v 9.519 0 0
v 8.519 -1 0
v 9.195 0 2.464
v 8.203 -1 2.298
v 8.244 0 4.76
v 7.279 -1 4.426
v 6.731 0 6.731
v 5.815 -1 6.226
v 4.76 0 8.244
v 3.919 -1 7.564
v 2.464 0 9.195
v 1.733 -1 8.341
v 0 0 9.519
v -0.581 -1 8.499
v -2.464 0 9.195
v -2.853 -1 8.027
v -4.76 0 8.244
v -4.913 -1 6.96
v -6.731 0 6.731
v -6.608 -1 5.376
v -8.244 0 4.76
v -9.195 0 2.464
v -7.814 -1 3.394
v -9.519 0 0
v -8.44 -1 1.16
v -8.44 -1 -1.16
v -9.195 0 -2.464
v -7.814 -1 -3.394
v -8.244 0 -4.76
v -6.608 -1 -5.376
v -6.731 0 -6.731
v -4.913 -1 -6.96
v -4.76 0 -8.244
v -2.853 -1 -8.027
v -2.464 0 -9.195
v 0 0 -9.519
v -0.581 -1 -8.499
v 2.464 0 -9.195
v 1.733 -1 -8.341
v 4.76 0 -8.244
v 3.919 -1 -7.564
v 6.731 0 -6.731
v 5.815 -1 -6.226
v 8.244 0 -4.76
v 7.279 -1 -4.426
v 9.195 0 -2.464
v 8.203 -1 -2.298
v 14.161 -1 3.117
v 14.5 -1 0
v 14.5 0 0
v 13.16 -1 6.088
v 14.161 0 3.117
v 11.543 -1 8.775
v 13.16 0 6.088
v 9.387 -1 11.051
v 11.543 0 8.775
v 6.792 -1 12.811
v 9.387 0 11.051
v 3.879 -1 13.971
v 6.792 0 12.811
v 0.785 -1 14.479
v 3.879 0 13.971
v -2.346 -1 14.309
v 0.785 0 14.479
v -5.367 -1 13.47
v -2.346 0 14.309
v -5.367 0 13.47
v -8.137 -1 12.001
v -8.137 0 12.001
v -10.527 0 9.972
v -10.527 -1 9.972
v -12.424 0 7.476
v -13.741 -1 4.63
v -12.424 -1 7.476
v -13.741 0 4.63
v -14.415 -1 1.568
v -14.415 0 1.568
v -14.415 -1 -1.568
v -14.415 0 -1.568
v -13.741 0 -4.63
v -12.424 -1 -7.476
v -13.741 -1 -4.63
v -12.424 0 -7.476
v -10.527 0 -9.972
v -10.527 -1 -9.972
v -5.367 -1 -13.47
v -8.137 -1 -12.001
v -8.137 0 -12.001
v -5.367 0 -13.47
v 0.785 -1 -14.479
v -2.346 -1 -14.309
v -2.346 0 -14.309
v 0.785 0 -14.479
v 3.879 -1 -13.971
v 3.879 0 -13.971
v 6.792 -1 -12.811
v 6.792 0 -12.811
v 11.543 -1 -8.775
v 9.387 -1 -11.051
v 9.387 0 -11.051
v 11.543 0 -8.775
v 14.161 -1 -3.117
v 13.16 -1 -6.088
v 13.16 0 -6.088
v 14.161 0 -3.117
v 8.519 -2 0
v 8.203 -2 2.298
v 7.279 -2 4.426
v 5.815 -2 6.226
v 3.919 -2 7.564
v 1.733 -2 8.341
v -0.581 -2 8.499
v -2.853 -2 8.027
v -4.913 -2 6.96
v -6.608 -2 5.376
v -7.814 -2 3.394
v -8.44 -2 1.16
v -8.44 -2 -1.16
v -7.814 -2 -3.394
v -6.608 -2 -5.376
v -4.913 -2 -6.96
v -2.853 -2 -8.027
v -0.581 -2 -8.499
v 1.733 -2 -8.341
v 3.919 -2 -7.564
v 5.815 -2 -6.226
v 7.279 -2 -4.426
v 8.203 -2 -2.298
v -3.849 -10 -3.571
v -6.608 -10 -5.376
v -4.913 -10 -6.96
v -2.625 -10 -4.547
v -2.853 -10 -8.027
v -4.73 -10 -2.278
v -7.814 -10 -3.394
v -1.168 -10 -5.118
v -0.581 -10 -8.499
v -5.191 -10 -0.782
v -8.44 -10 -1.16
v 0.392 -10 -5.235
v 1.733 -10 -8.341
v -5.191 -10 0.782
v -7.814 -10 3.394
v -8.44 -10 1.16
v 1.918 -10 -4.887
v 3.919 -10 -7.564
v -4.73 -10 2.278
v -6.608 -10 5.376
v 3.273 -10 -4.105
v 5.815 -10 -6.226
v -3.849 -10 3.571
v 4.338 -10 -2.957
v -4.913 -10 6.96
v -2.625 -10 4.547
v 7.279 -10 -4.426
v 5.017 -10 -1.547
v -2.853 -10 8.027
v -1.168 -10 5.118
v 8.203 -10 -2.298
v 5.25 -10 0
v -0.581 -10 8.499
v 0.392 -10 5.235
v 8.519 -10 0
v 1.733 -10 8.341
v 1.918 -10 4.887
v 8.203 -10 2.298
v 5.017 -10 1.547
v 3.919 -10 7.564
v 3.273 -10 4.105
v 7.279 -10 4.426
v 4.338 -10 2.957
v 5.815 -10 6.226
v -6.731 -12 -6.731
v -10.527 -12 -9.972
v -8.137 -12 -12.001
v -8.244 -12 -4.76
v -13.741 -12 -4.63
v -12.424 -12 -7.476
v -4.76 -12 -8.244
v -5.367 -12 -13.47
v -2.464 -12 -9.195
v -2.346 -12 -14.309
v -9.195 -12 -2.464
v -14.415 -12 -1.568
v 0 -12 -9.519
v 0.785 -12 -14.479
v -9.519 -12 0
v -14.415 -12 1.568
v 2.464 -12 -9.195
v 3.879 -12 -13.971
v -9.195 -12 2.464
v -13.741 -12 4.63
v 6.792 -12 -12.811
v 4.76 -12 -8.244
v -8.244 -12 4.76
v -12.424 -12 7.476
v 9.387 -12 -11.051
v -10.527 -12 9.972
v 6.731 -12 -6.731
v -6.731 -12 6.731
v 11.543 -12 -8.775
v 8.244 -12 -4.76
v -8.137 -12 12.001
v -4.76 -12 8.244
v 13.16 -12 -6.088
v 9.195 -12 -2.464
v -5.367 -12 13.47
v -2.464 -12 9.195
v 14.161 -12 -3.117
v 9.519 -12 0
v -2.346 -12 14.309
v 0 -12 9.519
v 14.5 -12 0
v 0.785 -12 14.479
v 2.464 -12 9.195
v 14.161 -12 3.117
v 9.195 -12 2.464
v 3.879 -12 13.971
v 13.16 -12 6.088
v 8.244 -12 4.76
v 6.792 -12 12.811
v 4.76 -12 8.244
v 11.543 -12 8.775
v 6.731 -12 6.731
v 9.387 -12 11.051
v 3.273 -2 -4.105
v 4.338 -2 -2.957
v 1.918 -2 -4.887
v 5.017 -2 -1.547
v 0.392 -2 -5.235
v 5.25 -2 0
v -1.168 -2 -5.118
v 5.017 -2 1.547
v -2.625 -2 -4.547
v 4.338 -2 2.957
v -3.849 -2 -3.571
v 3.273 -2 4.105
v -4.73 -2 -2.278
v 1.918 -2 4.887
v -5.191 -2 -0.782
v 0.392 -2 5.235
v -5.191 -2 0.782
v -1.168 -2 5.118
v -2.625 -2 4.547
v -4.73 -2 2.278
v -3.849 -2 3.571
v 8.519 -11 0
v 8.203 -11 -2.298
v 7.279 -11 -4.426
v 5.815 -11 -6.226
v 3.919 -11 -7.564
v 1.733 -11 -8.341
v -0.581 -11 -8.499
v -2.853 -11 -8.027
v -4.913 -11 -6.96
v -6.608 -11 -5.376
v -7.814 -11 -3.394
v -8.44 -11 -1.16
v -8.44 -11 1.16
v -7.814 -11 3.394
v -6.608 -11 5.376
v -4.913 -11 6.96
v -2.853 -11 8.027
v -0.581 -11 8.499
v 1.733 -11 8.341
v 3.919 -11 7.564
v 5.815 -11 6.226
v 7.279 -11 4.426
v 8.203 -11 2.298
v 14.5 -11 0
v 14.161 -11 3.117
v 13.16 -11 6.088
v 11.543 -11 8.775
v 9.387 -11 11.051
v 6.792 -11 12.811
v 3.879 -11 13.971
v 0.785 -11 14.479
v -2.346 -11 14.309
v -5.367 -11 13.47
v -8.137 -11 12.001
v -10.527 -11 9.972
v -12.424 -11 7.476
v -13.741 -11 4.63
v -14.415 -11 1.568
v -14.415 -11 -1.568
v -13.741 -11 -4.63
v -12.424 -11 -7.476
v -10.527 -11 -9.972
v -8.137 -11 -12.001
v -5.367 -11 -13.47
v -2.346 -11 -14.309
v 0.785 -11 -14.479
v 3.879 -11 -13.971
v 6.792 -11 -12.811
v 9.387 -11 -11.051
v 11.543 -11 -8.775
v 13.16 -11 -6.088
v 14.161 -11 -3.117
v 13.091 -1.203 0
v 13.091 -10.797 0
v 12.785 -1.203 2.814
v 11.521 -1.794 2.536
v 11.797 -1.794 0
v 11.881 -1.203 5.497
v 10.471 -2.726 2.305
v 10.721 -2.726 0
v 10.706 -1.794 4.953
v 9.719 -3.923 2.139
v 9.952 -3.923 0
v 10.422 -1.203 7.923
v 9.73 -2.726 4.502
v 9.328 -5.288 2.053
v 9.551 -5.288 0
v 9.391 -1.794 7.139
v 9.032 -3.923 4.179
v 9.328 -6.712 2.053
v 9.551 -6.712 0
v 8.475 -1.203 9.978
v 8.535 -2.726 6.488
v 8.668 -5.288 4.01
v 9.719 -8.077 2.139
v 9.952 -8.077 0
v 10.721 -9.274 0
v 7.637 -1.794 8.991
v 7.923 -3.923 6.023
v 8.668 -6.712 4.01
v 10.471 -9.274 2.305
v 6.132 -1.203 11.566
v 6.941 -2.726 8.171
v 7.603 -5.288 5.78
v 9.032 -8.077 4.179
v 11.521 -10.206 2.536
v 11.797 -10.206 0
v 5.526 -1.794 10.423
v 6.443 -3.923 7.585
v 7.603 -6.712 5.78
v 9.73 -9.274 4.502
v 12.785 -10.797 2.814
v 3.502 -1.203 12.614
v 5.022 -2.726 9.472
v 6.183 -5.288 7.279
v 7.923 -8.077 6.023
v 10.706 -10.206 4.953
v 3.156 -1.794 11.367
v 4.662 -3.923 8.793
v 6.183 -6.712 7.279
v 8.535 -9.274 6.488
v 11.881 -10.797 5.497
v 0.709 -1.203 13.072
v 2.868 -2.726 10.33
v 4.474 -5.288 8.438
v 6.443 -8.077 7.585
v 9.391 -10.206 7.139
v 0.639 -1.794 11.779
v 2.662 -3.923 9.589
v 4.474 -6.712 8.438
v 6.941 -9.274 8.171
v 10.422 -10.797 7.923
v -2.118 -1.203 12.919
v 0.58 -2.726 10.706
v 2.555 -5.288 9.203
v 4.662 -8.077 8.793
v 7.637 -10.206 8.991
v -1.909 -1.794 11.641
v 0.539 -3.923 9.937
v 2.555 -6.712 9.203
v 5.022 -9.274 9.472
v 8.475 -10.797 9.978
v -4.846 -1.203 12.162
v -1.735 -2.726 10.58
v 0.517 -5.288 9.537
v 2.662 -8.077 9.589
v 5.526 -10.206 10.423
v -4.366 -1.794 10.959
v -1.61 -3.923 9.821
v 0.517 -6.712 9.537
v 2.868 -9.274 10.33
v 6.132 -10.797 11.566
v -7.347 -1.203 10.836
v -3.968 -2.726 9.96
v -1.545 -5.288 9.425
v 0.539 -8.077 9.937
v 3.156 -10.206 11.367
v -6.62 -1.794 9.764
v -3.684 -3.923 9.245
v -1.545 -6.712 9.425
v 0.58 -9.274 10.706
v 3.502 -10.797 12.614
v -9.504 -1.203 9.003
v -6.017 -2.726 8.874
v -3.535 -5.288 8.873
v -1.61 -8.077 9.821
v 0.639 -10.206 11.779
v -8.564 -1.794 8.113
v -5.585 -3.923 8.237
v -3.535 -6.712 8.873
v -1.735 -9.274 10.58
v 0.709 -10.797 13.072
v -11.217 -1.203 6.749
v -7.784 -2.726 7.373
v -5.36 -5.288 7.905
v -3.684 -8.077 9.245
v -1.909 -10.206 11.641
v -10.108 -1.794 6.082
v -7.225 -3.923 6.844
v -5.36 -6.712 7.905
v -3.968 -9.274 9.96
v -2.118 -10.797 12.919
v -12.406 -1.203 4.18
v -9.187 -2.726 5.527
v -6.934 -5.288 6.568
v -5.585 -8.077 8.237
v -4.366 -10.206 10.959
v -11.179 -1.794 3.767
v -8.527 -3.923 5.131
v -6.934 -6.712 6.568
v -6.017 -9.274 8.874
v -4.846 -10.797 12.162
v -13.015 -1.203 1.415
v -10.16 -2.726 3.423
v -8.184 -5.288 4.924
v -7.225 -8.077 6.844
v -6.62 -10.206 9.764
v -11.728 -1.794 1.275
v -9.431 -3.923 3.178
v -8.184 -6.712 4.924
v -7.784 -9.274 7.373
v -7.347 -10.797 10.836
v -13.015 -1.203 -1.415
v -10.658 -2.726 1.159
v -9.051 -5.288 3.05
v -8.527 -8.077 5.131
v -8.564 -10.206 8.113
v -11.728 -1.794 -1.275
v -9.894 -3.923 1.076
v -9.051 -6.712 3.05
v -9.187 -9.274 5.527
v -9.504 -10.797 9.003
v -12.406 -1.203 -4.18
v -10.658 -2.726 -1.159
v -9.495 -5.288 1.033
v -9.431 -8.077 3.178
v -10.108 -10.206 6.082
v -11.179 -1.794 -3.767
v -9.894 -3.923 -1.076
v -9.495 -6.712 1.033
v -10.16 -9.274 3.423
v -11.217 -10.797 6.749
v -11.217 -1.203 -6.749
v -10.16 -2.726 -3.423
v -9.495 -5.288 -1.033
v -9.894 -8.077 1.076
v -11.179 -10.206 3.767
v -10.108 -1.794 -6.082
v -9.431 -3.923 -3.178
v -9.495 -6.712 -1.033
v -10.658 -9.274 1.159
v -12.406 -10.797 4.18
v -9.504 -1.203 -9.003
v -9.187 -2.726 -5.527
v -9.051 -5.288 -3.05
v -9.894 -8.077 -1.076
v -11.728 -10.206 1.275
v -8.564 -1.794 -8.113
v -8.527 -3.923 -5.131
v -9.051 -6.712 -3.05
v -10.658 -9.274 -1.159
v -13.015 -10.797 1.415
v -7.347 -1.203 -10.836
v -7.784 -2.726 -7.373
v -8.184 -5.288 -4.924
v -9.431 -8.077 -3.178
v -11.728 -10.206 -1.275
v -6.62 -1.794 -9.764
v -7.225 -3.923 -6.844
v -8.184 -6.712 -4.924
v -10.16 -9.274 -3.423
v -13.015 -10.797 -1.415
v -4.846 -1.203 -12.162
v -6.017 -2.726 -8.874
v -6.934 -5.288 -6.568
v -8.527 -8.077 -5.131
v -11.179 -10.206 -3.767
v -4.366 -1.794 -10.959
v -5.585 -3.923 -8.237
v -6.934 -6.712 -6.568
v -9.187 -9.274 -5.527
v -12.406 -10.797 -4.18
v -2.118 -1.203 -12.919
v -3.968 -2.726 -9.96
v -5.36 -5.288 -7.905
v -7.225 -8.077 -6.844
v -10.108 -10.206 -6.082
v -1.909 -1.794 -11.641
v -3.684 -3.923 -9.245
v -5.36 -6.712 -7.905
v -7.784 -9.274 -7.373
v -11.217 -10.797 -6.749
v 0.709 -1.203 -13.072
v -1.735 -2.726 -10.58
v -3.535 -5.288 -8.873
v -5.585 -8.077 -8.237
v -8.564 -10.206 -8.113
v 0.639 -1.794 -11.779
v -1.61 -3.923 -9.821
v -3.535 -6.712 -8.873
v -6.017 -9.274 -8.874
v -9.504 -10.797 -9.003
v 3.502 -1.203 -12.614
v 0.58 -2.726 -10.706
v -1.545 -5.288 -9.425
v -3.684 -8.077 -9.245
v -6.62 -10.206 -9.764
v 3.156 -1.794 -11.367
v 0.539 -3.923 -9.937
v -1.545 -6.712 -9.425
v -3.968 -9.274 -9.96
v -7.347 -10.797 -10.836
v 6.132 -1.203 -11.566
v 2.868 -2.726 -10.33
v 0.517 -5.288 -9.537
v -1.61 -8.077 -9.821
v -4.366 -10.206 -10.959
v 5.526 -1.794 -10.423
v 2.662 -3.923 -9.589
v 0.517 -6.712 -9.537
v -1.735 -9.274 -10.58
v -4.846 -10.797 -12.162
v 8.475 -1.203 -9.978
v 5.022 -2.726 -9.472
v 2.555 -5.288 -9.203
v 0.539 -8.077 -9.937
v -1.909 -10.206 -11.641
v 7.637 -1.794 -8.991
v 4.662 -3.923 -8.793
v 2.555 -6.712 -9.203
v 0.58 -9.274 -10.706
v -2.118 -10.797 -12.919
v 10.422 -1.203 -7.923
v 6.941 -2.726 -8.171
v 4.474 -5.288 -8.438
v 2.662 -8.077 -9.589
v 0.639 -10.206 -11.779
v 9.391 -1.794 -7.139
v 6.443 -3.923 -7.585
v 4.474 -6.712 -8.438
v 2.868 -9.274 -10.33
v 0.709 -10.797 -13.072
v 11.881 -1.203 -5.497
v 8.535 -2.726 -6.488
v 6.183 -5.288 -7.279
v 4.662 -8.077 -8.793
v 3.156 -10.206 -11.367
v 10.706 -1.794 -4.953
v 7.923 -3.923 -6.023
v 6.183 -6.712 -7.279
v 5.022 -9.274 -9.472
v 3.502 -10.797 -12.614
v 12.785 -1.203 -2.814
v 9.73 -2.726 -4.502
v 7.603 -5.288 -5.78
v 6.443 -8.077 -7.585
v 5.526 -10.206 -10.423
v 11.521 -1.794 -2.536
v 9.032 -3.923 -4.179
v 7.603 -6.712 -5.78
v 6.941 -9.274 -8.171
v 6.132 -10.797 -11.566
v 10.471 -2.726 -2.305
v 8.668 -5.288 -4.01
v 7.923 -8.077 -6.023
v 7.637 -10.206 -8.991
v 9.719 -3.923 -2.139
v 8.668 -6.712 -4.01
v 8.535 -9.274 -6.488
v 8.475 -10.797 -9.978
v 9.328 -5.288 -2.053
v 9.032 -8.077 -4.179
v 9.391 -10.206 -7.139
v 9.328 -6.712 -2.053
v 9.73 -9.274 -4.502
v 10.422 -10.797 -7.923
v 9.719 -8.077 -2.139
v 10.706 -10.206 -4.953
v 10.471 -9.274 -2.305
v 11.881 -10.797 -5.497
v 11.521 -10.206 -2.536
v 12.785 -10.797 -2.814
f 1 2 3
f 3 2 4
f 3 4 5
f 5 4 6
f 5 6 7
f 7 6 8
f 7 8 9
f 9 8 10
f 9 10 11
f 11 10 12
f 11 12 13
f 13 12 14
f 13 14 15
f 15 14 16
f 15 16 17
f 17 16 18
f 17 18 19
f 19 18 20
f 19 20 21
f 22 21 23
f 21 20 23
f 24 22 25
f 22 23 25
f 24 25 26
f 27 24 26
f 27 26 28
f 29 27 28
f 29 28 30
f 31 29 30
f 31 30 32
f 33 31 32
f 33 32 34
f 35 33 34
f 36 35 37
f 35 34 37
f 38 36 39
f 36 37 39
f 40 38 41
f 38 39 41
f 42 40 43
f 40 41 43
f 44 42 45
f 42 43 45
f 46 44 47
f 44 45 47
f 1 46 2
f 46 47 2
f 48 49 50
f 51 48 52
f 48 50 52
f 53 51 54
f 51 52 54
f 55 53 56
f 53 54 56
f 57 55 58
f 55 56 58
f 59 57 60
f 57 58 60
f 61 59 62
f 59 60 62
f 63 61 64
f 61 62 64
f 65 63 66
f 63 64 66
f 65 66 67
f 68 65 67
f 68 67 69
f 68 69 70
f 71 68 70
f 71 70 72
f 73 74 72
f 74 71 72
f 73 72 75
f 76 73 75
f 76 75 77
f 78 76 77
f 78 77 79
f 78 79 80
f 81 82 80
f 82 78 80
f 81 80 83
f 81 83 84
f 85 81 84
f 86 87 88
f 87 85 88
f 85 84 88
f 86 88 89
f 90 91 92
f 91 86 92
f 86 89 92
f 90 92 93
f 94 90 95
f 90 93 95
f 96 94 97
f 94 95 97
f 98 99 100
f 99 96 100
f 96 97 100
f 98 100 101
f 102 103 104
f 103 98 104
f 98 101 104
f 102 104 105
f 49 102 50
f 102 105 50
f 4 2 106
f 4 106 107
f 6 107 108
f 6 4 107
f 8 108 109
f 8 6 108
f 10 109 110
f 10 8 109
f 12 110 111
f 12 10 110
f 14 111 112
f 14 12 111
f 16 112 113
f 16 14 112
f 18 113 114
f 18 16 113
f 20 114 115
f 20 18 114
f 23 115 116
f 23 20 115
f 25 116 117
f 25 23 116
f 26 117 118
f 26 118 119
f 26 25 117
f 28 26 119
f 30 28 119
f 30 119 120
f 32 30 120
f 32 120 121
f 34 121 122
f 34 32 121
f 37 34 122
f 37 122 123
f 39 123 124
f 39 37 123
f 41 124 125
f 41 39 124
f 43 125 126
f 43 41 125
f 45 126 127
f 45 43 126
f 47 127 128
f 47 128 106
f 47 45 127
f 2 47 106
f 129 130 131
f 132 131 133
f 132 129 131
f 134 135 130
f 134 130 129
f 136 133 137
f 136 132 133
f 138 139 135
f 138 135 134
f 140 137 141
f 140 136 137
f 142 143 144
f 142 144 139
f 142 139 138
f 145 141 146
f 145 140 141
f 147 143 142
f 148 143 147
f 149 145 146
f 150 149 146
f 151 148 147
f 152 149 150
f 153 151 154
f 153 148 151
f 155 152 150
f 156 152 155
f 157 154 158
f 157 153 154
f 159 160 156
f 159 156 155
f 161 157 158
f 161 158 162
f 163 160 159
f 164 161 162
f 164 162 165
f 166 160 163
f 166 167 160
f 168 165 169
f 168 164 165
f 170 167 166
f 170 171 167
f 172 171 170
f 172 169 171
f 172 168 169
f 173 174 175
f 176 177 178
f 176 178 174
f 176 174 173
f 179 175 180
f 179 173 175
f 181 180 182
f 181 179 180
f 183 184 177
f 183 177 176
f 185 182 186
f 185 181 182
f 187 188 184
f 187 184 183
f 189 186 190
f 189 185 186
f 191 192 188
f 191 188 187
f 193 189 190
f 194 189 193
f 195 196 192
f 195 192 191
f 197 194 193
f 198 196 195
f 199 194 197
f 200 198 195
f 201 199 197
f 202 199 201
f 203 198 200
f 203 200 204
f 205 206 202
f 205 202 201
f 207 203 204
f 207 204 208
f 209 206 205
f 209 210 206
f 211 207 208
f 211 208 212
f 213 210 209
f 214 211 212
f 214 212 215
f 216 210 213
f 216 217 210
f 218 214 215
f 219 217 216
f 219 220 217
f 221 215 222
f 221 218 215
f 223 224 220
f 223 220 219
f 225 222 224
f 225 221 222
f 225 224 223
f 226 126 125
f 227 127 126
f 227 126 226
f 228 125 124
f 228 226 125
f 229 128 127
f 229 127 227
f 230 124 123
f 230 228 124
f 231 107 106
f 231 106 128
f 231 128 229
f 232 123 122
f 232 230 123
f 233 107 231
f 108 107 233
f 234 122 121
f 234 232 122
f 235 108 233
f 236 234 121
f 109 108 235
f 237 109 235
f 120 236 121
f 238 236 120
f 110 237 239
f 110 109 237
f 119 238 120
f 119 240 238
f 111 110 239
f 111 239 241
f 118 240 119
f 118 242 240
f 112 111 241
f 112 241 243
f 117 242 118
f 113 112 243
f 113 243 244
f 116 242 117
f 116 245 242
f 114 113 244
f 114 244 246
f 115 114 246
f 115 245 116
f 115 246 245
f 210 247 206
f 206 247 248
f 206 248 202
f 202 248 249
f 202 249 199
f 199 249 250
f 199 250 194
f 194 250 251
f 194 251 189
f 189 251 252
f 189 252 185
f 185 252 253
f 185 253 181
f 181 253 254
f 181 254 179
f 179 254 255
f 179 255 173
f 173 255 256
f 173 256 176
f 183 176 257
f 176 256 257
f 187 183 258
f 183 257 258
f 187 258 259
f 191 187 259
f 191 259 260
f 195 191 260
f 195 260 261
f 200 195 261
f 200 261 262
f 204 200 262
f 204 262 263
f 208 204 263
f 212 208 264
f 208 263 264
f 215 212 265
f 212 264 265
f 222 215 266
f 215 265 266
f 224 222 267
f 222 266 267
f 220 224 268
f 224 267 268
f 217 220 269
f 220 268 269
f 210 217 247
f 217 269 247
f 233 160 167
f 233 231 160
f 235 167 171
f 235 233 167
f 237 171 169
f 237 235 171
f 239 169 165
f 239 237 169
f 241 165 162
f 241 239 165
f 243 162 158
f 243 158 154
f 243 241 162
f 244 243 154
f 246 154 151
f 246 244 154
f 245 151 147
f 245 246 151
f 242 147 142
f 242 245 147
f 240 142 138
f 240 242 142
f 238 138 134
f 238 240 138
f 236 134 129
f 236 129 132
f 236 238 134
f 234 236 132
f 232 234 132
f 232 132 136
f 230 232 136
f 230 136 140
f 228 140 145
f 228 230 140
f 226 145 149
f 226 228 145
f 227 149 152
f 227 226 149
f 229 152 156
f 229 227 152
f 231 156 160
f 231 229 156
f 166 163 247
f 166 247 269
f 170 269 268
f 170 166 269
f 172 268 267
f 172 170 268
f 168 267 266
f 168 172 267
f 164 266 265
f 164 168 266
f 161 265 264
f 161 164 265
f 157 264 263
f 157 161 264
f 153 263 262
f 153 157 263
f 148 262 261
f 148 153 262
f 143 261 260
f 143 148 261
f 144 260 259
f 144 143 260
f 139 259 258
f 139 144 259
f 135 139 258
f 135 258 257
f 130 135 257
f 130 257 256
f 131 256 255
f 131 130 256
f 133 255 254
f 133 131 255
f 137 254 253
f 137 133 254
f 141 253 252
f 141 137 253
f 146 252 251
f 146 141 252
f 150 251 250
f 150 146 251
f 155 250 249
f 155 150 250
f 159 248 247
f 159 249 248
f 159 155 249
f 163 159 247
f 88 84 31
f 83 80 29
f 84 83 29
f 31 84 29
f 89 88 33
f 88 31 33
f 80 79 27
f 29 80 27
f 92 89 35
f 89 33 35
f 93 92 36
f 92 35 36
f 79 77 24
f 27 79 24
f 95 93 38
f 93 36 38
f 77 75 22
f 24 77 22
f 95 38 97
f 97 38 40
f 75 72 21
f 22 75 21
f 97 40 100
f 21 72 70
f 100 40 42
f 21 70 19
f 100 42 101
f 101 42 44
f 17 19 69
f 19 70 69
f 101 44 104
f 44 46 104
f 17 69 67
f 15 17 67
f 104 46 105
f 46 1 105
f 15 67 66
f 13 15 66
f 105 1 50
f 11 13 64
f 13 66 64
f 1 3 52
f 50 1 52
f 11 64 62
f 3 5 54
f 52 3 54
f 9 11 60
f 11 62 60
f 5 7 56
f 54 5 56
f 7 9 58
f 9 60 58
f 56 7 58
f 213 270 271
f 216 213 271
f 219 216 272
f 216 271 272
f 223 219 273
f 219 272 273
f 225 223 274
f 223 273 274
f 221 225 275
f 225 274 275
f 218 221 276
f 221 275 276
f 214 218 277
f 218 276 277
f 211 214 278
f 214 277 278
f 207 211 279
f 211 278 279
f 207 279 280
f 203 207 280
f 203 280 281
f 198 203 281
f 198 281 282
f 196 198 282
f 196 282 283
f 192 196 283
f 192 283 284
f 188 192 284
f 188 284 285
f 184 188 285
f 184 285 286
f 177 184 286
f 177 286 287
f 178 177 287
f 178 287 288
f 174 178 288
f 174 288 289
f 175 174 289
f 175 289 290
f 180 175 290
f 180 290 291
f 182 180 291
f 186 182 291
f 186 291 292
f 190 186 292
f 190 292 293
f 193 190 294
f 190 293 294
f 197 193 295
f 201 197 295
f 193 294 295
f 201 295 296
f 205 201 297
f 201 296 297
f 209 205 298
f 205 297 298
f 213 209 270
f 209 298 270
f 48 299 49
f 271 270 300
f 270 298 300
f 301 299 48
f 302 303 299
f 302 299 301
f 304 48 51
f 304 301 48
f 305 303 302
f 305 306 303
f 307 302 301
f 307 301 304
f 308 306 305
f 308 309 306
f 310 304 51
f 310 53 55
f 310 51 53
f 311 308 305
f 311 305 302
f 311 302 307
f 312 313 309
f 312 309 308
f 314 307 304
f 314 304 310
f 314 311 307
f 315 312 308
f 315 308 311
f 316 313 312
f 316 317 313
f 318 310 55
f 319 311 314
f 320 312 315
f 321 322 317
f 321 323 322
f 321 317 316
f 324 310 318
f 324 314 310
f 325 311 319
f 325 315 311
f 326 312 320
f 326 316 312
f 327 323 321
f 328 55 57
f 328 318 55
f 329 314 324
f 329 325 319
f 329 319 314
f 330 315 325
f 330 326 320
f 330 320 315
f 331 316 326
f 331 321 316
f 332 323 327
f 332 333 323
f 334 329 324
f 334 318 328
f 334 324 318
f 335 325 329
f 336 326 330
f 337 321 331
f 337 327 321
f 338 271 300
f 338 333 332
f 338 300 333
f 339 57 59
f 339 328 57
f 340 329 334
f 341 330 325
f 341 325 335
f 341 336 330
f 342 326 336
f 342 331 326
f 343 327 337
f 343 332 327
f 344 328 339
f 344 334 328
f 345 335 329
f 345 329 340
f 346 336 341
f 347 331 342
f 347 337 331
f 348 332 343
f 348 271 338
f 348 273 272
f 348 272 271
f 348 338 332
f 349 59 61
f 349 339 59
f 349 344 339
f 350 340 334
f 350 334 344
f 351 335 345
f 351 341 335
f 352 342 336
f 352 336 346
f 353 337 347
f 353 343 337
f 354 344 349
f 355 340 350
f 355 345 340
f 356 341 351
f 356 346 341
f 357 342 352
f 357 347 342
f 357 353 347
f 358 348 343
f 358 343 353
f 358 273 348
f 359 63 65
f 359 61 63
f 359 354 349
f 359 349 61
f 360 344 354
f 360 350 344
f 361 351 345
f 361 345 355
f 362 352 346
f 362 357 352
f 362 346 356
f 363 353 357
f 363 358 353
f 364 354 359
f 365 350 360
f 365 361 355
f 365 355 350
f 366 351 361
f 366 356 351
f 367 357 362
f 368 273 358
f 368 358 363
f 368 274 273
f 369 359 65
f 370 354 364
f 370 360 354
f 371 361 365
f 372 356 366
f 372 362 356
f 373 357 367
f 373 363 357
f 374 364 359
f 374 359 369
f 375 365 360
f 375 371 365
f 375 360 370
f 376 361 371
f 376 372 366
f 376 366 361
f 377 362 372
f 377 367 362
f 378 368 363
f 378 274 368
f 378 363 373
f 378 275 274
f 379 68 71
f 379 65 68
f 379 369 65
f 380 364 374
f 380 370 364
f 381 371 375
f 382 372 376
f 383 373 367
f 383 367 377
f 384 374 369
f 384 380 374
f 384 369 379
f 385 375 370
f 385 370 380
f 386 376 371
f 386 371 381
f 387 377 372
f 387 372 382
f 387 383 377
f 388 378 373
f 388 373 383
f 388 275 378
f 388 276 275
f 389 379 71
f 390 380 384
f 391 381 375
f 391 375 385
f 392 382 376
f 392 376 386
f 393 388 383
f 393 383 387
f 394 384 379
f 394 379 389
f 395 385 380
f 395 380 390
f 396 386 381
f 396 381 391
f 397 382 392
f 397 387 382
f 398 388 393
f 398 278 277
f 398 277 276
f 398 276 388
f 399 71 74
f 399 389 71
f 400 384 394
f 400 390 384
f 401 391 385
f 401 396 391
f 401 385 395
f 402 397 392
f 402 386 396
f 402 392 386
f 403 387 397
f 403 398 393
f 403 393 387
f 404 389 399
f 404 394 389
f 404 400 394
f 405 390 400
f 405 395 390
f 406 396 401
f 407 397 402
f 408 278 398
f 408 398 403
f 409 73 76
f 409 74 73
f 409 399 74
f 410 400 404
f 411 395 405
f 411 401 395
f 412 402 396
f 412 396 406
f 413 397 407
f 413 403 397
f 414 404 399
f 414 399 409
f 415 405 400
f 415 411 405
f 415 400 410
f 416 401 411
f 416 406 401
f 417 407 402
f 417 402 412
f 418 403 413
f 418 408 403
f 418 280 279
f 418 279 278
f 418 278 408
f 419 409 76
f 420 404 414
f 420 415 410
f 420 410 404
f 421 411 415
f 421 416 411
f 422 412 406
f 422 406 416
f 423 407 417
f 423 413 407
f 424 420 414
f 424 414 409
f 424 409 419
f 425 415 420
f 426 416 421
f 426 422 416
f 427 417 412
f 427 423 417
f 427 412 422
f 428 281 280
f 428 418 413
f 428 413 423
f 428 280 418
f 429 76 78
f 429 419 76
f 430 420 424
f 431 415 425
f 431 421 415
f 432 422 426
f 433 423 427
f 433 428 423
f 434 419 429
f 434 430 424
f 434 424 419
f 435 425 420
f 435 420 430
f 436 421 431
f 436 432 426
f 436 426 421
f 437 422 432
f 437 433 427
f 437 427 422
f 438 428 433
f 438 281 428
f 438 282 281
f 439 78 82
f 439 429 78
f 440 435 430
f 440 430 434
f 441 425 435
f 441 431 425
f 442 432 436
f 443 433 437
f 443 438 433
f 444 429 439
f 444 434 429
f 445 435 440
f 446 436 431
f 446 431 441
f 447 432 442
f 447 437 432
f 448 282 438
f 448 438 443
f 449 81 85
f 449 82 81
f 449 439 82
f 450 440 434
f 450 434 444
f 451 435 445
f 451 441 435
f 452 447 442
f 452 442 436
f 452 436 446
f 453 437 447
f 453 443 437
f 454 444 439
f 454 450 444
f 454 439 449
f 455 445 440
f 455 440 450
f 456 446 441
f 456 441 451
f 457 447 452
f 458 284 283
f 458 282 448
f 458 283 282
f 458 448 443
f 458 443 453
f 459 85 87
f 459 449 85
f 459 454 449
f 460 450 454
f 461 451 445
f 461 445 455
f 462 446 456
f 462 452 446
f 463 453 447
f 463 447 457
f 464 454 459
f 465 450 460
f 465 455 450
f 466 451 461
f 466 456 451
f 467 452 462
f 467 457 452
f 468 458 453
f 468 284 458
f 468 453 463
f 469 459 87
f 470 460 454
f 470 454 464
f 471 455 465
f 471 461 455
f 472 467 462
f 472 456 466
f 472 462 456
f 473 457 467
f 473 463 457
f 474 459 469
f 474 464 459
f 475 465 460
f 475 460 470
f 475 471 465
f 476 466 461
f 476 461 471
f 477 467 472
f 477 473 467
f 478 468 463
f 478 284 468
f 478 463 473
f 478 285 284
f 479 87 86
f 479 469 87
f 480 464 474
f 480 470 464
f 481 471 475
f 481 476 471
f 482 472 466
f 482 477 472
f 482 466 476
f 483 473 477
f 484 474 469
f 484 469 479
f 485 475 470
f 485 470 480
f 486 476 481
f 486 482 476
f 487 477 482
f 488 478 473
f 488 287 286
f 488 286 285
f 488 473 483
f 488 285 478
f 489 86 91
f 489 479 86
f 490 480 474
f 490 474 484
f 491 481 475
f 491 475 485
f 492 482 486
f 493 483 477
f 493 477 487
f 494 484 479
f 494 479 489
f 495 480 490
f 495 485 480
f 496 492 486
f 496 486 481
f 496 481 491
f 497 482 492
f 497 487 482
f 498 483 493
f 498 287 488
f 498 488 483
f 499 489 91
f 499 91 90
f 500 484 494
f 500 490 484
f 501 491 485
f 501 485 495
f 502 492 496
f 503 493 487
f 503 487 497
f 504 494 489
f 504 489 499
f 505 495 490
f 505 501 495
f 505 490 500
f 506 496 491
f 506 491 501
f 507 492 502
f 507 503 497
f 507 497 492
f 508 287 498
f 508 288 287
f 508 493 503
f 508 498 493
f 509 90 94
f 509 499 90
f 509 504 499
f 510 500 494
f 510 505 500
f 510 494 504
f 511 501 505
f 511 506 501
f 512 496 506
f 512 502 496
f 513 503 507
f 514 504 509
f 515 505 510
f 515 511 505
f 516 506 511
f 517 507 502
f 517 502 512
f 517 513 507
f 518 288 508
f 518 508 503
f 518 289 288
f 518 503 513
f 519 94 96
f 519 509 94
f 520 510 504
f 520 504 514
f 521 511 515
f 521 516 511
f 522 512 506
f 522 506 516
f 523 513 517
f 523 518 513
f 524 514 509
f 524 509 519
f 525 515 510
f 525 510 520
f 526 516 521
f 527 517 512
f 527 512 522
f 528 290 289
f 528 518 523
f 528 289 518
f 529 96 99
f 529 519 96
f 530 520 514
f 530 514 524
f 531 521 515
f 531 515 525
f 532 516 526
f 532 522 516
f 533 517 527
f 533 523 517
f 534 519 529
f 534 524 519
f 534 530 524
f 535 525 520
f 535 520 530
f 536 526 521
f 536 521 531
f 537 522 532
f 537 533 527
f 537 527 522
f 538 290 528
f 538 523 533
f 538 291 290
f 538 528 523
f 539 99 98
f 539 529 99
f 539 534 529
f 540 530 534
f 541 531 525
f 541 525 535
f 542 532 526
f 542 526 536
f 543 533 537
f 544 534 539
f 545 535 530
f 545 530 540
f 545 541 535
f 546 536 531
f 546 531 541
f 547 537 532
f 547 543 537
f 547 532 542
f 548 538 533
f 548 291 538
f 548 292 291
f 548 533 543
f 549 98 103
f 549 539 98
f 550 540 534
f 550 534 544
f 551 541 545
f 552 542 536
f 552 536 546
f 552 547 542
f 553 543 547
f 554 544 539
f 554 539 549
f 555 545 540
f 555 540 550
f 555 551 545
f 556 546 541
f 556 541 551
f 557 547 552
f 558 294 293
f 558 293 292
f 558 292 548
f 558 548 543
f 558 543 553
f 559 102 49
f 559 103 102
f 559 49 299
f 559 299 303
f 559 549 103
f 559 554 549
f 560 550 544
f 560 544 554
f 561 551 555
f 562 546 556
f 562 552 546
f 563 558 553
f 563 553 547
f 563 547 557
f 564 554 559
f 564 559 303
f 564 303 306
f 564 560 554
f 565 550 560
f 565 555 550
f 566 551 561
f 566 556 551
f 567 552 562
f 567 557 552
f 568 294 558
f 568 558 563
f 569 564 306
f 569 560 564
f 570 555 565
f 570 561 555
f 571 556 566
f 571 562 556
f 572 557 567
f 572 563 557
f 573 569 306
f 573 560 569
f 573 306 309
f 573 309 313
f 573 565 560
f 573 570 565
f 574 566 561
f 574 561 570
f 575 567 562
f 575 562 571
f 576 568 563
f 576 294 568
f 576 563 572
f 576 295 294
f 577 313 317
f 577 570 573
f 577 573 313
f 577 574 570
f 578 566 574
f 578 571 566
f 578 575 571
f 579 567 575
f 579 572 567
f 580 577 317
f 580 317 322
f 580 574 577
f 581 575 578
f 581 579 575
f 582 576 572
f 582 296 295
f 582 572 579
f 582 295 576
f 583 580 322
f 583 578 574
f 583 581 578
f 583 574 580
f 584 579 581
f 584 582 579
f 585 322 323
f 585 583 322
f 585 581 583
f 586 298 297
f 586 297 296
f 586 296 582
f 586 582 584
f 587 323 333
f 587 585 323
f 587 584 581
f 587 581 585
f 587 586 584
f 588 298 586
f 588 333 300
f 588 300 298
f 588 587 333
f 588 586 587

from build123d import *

# Parameters (mm, degrees)
F0_R     = 14.5
F1_DEPTH = 12
F2_W     = 5.25
F2_H     = 8
F2_R     = 5
F4_SIZE  = 1


with BuildPart() as f1:
    # F0 (on Front) → F1 (new body)
    with BuildSketch(Plane.XZ):
        Circle(F0_R)
    extrude(amount=F1_DEPTH)

    # F2 (on Top) → F3 (revolve, cut)
    with BuildSketch(Plane.XY):
        with Locations((2.625, -6)):
            Rectangle(F2_W, F2_H)
        Polygon((5.25, -10), (0, -10), (0, -12.965777), (8.519073, -12.965777), (8.519073, -10), align=None)
        Polygon((0, 0), (0, -2), (5.25, -2), (8.519073, -2), (8.519073, 0), align=None)
        with Locations((14.5, -6)):
            Circle(F2_R)
    revolve(axis=Axis((0, -8.281275, 0), (0, -1, 0)), mode=Mode.SUBTRACT)

    # F4
    f4_edges = [f1.edges().sort_by_distance(p)[0] for p in [
        (-8.519073, 0, 0),
        (-8.519073, -12, 0),
    ]]
    chamfer(f4_edges, length=F4_SIZE)


solid = f1.part
